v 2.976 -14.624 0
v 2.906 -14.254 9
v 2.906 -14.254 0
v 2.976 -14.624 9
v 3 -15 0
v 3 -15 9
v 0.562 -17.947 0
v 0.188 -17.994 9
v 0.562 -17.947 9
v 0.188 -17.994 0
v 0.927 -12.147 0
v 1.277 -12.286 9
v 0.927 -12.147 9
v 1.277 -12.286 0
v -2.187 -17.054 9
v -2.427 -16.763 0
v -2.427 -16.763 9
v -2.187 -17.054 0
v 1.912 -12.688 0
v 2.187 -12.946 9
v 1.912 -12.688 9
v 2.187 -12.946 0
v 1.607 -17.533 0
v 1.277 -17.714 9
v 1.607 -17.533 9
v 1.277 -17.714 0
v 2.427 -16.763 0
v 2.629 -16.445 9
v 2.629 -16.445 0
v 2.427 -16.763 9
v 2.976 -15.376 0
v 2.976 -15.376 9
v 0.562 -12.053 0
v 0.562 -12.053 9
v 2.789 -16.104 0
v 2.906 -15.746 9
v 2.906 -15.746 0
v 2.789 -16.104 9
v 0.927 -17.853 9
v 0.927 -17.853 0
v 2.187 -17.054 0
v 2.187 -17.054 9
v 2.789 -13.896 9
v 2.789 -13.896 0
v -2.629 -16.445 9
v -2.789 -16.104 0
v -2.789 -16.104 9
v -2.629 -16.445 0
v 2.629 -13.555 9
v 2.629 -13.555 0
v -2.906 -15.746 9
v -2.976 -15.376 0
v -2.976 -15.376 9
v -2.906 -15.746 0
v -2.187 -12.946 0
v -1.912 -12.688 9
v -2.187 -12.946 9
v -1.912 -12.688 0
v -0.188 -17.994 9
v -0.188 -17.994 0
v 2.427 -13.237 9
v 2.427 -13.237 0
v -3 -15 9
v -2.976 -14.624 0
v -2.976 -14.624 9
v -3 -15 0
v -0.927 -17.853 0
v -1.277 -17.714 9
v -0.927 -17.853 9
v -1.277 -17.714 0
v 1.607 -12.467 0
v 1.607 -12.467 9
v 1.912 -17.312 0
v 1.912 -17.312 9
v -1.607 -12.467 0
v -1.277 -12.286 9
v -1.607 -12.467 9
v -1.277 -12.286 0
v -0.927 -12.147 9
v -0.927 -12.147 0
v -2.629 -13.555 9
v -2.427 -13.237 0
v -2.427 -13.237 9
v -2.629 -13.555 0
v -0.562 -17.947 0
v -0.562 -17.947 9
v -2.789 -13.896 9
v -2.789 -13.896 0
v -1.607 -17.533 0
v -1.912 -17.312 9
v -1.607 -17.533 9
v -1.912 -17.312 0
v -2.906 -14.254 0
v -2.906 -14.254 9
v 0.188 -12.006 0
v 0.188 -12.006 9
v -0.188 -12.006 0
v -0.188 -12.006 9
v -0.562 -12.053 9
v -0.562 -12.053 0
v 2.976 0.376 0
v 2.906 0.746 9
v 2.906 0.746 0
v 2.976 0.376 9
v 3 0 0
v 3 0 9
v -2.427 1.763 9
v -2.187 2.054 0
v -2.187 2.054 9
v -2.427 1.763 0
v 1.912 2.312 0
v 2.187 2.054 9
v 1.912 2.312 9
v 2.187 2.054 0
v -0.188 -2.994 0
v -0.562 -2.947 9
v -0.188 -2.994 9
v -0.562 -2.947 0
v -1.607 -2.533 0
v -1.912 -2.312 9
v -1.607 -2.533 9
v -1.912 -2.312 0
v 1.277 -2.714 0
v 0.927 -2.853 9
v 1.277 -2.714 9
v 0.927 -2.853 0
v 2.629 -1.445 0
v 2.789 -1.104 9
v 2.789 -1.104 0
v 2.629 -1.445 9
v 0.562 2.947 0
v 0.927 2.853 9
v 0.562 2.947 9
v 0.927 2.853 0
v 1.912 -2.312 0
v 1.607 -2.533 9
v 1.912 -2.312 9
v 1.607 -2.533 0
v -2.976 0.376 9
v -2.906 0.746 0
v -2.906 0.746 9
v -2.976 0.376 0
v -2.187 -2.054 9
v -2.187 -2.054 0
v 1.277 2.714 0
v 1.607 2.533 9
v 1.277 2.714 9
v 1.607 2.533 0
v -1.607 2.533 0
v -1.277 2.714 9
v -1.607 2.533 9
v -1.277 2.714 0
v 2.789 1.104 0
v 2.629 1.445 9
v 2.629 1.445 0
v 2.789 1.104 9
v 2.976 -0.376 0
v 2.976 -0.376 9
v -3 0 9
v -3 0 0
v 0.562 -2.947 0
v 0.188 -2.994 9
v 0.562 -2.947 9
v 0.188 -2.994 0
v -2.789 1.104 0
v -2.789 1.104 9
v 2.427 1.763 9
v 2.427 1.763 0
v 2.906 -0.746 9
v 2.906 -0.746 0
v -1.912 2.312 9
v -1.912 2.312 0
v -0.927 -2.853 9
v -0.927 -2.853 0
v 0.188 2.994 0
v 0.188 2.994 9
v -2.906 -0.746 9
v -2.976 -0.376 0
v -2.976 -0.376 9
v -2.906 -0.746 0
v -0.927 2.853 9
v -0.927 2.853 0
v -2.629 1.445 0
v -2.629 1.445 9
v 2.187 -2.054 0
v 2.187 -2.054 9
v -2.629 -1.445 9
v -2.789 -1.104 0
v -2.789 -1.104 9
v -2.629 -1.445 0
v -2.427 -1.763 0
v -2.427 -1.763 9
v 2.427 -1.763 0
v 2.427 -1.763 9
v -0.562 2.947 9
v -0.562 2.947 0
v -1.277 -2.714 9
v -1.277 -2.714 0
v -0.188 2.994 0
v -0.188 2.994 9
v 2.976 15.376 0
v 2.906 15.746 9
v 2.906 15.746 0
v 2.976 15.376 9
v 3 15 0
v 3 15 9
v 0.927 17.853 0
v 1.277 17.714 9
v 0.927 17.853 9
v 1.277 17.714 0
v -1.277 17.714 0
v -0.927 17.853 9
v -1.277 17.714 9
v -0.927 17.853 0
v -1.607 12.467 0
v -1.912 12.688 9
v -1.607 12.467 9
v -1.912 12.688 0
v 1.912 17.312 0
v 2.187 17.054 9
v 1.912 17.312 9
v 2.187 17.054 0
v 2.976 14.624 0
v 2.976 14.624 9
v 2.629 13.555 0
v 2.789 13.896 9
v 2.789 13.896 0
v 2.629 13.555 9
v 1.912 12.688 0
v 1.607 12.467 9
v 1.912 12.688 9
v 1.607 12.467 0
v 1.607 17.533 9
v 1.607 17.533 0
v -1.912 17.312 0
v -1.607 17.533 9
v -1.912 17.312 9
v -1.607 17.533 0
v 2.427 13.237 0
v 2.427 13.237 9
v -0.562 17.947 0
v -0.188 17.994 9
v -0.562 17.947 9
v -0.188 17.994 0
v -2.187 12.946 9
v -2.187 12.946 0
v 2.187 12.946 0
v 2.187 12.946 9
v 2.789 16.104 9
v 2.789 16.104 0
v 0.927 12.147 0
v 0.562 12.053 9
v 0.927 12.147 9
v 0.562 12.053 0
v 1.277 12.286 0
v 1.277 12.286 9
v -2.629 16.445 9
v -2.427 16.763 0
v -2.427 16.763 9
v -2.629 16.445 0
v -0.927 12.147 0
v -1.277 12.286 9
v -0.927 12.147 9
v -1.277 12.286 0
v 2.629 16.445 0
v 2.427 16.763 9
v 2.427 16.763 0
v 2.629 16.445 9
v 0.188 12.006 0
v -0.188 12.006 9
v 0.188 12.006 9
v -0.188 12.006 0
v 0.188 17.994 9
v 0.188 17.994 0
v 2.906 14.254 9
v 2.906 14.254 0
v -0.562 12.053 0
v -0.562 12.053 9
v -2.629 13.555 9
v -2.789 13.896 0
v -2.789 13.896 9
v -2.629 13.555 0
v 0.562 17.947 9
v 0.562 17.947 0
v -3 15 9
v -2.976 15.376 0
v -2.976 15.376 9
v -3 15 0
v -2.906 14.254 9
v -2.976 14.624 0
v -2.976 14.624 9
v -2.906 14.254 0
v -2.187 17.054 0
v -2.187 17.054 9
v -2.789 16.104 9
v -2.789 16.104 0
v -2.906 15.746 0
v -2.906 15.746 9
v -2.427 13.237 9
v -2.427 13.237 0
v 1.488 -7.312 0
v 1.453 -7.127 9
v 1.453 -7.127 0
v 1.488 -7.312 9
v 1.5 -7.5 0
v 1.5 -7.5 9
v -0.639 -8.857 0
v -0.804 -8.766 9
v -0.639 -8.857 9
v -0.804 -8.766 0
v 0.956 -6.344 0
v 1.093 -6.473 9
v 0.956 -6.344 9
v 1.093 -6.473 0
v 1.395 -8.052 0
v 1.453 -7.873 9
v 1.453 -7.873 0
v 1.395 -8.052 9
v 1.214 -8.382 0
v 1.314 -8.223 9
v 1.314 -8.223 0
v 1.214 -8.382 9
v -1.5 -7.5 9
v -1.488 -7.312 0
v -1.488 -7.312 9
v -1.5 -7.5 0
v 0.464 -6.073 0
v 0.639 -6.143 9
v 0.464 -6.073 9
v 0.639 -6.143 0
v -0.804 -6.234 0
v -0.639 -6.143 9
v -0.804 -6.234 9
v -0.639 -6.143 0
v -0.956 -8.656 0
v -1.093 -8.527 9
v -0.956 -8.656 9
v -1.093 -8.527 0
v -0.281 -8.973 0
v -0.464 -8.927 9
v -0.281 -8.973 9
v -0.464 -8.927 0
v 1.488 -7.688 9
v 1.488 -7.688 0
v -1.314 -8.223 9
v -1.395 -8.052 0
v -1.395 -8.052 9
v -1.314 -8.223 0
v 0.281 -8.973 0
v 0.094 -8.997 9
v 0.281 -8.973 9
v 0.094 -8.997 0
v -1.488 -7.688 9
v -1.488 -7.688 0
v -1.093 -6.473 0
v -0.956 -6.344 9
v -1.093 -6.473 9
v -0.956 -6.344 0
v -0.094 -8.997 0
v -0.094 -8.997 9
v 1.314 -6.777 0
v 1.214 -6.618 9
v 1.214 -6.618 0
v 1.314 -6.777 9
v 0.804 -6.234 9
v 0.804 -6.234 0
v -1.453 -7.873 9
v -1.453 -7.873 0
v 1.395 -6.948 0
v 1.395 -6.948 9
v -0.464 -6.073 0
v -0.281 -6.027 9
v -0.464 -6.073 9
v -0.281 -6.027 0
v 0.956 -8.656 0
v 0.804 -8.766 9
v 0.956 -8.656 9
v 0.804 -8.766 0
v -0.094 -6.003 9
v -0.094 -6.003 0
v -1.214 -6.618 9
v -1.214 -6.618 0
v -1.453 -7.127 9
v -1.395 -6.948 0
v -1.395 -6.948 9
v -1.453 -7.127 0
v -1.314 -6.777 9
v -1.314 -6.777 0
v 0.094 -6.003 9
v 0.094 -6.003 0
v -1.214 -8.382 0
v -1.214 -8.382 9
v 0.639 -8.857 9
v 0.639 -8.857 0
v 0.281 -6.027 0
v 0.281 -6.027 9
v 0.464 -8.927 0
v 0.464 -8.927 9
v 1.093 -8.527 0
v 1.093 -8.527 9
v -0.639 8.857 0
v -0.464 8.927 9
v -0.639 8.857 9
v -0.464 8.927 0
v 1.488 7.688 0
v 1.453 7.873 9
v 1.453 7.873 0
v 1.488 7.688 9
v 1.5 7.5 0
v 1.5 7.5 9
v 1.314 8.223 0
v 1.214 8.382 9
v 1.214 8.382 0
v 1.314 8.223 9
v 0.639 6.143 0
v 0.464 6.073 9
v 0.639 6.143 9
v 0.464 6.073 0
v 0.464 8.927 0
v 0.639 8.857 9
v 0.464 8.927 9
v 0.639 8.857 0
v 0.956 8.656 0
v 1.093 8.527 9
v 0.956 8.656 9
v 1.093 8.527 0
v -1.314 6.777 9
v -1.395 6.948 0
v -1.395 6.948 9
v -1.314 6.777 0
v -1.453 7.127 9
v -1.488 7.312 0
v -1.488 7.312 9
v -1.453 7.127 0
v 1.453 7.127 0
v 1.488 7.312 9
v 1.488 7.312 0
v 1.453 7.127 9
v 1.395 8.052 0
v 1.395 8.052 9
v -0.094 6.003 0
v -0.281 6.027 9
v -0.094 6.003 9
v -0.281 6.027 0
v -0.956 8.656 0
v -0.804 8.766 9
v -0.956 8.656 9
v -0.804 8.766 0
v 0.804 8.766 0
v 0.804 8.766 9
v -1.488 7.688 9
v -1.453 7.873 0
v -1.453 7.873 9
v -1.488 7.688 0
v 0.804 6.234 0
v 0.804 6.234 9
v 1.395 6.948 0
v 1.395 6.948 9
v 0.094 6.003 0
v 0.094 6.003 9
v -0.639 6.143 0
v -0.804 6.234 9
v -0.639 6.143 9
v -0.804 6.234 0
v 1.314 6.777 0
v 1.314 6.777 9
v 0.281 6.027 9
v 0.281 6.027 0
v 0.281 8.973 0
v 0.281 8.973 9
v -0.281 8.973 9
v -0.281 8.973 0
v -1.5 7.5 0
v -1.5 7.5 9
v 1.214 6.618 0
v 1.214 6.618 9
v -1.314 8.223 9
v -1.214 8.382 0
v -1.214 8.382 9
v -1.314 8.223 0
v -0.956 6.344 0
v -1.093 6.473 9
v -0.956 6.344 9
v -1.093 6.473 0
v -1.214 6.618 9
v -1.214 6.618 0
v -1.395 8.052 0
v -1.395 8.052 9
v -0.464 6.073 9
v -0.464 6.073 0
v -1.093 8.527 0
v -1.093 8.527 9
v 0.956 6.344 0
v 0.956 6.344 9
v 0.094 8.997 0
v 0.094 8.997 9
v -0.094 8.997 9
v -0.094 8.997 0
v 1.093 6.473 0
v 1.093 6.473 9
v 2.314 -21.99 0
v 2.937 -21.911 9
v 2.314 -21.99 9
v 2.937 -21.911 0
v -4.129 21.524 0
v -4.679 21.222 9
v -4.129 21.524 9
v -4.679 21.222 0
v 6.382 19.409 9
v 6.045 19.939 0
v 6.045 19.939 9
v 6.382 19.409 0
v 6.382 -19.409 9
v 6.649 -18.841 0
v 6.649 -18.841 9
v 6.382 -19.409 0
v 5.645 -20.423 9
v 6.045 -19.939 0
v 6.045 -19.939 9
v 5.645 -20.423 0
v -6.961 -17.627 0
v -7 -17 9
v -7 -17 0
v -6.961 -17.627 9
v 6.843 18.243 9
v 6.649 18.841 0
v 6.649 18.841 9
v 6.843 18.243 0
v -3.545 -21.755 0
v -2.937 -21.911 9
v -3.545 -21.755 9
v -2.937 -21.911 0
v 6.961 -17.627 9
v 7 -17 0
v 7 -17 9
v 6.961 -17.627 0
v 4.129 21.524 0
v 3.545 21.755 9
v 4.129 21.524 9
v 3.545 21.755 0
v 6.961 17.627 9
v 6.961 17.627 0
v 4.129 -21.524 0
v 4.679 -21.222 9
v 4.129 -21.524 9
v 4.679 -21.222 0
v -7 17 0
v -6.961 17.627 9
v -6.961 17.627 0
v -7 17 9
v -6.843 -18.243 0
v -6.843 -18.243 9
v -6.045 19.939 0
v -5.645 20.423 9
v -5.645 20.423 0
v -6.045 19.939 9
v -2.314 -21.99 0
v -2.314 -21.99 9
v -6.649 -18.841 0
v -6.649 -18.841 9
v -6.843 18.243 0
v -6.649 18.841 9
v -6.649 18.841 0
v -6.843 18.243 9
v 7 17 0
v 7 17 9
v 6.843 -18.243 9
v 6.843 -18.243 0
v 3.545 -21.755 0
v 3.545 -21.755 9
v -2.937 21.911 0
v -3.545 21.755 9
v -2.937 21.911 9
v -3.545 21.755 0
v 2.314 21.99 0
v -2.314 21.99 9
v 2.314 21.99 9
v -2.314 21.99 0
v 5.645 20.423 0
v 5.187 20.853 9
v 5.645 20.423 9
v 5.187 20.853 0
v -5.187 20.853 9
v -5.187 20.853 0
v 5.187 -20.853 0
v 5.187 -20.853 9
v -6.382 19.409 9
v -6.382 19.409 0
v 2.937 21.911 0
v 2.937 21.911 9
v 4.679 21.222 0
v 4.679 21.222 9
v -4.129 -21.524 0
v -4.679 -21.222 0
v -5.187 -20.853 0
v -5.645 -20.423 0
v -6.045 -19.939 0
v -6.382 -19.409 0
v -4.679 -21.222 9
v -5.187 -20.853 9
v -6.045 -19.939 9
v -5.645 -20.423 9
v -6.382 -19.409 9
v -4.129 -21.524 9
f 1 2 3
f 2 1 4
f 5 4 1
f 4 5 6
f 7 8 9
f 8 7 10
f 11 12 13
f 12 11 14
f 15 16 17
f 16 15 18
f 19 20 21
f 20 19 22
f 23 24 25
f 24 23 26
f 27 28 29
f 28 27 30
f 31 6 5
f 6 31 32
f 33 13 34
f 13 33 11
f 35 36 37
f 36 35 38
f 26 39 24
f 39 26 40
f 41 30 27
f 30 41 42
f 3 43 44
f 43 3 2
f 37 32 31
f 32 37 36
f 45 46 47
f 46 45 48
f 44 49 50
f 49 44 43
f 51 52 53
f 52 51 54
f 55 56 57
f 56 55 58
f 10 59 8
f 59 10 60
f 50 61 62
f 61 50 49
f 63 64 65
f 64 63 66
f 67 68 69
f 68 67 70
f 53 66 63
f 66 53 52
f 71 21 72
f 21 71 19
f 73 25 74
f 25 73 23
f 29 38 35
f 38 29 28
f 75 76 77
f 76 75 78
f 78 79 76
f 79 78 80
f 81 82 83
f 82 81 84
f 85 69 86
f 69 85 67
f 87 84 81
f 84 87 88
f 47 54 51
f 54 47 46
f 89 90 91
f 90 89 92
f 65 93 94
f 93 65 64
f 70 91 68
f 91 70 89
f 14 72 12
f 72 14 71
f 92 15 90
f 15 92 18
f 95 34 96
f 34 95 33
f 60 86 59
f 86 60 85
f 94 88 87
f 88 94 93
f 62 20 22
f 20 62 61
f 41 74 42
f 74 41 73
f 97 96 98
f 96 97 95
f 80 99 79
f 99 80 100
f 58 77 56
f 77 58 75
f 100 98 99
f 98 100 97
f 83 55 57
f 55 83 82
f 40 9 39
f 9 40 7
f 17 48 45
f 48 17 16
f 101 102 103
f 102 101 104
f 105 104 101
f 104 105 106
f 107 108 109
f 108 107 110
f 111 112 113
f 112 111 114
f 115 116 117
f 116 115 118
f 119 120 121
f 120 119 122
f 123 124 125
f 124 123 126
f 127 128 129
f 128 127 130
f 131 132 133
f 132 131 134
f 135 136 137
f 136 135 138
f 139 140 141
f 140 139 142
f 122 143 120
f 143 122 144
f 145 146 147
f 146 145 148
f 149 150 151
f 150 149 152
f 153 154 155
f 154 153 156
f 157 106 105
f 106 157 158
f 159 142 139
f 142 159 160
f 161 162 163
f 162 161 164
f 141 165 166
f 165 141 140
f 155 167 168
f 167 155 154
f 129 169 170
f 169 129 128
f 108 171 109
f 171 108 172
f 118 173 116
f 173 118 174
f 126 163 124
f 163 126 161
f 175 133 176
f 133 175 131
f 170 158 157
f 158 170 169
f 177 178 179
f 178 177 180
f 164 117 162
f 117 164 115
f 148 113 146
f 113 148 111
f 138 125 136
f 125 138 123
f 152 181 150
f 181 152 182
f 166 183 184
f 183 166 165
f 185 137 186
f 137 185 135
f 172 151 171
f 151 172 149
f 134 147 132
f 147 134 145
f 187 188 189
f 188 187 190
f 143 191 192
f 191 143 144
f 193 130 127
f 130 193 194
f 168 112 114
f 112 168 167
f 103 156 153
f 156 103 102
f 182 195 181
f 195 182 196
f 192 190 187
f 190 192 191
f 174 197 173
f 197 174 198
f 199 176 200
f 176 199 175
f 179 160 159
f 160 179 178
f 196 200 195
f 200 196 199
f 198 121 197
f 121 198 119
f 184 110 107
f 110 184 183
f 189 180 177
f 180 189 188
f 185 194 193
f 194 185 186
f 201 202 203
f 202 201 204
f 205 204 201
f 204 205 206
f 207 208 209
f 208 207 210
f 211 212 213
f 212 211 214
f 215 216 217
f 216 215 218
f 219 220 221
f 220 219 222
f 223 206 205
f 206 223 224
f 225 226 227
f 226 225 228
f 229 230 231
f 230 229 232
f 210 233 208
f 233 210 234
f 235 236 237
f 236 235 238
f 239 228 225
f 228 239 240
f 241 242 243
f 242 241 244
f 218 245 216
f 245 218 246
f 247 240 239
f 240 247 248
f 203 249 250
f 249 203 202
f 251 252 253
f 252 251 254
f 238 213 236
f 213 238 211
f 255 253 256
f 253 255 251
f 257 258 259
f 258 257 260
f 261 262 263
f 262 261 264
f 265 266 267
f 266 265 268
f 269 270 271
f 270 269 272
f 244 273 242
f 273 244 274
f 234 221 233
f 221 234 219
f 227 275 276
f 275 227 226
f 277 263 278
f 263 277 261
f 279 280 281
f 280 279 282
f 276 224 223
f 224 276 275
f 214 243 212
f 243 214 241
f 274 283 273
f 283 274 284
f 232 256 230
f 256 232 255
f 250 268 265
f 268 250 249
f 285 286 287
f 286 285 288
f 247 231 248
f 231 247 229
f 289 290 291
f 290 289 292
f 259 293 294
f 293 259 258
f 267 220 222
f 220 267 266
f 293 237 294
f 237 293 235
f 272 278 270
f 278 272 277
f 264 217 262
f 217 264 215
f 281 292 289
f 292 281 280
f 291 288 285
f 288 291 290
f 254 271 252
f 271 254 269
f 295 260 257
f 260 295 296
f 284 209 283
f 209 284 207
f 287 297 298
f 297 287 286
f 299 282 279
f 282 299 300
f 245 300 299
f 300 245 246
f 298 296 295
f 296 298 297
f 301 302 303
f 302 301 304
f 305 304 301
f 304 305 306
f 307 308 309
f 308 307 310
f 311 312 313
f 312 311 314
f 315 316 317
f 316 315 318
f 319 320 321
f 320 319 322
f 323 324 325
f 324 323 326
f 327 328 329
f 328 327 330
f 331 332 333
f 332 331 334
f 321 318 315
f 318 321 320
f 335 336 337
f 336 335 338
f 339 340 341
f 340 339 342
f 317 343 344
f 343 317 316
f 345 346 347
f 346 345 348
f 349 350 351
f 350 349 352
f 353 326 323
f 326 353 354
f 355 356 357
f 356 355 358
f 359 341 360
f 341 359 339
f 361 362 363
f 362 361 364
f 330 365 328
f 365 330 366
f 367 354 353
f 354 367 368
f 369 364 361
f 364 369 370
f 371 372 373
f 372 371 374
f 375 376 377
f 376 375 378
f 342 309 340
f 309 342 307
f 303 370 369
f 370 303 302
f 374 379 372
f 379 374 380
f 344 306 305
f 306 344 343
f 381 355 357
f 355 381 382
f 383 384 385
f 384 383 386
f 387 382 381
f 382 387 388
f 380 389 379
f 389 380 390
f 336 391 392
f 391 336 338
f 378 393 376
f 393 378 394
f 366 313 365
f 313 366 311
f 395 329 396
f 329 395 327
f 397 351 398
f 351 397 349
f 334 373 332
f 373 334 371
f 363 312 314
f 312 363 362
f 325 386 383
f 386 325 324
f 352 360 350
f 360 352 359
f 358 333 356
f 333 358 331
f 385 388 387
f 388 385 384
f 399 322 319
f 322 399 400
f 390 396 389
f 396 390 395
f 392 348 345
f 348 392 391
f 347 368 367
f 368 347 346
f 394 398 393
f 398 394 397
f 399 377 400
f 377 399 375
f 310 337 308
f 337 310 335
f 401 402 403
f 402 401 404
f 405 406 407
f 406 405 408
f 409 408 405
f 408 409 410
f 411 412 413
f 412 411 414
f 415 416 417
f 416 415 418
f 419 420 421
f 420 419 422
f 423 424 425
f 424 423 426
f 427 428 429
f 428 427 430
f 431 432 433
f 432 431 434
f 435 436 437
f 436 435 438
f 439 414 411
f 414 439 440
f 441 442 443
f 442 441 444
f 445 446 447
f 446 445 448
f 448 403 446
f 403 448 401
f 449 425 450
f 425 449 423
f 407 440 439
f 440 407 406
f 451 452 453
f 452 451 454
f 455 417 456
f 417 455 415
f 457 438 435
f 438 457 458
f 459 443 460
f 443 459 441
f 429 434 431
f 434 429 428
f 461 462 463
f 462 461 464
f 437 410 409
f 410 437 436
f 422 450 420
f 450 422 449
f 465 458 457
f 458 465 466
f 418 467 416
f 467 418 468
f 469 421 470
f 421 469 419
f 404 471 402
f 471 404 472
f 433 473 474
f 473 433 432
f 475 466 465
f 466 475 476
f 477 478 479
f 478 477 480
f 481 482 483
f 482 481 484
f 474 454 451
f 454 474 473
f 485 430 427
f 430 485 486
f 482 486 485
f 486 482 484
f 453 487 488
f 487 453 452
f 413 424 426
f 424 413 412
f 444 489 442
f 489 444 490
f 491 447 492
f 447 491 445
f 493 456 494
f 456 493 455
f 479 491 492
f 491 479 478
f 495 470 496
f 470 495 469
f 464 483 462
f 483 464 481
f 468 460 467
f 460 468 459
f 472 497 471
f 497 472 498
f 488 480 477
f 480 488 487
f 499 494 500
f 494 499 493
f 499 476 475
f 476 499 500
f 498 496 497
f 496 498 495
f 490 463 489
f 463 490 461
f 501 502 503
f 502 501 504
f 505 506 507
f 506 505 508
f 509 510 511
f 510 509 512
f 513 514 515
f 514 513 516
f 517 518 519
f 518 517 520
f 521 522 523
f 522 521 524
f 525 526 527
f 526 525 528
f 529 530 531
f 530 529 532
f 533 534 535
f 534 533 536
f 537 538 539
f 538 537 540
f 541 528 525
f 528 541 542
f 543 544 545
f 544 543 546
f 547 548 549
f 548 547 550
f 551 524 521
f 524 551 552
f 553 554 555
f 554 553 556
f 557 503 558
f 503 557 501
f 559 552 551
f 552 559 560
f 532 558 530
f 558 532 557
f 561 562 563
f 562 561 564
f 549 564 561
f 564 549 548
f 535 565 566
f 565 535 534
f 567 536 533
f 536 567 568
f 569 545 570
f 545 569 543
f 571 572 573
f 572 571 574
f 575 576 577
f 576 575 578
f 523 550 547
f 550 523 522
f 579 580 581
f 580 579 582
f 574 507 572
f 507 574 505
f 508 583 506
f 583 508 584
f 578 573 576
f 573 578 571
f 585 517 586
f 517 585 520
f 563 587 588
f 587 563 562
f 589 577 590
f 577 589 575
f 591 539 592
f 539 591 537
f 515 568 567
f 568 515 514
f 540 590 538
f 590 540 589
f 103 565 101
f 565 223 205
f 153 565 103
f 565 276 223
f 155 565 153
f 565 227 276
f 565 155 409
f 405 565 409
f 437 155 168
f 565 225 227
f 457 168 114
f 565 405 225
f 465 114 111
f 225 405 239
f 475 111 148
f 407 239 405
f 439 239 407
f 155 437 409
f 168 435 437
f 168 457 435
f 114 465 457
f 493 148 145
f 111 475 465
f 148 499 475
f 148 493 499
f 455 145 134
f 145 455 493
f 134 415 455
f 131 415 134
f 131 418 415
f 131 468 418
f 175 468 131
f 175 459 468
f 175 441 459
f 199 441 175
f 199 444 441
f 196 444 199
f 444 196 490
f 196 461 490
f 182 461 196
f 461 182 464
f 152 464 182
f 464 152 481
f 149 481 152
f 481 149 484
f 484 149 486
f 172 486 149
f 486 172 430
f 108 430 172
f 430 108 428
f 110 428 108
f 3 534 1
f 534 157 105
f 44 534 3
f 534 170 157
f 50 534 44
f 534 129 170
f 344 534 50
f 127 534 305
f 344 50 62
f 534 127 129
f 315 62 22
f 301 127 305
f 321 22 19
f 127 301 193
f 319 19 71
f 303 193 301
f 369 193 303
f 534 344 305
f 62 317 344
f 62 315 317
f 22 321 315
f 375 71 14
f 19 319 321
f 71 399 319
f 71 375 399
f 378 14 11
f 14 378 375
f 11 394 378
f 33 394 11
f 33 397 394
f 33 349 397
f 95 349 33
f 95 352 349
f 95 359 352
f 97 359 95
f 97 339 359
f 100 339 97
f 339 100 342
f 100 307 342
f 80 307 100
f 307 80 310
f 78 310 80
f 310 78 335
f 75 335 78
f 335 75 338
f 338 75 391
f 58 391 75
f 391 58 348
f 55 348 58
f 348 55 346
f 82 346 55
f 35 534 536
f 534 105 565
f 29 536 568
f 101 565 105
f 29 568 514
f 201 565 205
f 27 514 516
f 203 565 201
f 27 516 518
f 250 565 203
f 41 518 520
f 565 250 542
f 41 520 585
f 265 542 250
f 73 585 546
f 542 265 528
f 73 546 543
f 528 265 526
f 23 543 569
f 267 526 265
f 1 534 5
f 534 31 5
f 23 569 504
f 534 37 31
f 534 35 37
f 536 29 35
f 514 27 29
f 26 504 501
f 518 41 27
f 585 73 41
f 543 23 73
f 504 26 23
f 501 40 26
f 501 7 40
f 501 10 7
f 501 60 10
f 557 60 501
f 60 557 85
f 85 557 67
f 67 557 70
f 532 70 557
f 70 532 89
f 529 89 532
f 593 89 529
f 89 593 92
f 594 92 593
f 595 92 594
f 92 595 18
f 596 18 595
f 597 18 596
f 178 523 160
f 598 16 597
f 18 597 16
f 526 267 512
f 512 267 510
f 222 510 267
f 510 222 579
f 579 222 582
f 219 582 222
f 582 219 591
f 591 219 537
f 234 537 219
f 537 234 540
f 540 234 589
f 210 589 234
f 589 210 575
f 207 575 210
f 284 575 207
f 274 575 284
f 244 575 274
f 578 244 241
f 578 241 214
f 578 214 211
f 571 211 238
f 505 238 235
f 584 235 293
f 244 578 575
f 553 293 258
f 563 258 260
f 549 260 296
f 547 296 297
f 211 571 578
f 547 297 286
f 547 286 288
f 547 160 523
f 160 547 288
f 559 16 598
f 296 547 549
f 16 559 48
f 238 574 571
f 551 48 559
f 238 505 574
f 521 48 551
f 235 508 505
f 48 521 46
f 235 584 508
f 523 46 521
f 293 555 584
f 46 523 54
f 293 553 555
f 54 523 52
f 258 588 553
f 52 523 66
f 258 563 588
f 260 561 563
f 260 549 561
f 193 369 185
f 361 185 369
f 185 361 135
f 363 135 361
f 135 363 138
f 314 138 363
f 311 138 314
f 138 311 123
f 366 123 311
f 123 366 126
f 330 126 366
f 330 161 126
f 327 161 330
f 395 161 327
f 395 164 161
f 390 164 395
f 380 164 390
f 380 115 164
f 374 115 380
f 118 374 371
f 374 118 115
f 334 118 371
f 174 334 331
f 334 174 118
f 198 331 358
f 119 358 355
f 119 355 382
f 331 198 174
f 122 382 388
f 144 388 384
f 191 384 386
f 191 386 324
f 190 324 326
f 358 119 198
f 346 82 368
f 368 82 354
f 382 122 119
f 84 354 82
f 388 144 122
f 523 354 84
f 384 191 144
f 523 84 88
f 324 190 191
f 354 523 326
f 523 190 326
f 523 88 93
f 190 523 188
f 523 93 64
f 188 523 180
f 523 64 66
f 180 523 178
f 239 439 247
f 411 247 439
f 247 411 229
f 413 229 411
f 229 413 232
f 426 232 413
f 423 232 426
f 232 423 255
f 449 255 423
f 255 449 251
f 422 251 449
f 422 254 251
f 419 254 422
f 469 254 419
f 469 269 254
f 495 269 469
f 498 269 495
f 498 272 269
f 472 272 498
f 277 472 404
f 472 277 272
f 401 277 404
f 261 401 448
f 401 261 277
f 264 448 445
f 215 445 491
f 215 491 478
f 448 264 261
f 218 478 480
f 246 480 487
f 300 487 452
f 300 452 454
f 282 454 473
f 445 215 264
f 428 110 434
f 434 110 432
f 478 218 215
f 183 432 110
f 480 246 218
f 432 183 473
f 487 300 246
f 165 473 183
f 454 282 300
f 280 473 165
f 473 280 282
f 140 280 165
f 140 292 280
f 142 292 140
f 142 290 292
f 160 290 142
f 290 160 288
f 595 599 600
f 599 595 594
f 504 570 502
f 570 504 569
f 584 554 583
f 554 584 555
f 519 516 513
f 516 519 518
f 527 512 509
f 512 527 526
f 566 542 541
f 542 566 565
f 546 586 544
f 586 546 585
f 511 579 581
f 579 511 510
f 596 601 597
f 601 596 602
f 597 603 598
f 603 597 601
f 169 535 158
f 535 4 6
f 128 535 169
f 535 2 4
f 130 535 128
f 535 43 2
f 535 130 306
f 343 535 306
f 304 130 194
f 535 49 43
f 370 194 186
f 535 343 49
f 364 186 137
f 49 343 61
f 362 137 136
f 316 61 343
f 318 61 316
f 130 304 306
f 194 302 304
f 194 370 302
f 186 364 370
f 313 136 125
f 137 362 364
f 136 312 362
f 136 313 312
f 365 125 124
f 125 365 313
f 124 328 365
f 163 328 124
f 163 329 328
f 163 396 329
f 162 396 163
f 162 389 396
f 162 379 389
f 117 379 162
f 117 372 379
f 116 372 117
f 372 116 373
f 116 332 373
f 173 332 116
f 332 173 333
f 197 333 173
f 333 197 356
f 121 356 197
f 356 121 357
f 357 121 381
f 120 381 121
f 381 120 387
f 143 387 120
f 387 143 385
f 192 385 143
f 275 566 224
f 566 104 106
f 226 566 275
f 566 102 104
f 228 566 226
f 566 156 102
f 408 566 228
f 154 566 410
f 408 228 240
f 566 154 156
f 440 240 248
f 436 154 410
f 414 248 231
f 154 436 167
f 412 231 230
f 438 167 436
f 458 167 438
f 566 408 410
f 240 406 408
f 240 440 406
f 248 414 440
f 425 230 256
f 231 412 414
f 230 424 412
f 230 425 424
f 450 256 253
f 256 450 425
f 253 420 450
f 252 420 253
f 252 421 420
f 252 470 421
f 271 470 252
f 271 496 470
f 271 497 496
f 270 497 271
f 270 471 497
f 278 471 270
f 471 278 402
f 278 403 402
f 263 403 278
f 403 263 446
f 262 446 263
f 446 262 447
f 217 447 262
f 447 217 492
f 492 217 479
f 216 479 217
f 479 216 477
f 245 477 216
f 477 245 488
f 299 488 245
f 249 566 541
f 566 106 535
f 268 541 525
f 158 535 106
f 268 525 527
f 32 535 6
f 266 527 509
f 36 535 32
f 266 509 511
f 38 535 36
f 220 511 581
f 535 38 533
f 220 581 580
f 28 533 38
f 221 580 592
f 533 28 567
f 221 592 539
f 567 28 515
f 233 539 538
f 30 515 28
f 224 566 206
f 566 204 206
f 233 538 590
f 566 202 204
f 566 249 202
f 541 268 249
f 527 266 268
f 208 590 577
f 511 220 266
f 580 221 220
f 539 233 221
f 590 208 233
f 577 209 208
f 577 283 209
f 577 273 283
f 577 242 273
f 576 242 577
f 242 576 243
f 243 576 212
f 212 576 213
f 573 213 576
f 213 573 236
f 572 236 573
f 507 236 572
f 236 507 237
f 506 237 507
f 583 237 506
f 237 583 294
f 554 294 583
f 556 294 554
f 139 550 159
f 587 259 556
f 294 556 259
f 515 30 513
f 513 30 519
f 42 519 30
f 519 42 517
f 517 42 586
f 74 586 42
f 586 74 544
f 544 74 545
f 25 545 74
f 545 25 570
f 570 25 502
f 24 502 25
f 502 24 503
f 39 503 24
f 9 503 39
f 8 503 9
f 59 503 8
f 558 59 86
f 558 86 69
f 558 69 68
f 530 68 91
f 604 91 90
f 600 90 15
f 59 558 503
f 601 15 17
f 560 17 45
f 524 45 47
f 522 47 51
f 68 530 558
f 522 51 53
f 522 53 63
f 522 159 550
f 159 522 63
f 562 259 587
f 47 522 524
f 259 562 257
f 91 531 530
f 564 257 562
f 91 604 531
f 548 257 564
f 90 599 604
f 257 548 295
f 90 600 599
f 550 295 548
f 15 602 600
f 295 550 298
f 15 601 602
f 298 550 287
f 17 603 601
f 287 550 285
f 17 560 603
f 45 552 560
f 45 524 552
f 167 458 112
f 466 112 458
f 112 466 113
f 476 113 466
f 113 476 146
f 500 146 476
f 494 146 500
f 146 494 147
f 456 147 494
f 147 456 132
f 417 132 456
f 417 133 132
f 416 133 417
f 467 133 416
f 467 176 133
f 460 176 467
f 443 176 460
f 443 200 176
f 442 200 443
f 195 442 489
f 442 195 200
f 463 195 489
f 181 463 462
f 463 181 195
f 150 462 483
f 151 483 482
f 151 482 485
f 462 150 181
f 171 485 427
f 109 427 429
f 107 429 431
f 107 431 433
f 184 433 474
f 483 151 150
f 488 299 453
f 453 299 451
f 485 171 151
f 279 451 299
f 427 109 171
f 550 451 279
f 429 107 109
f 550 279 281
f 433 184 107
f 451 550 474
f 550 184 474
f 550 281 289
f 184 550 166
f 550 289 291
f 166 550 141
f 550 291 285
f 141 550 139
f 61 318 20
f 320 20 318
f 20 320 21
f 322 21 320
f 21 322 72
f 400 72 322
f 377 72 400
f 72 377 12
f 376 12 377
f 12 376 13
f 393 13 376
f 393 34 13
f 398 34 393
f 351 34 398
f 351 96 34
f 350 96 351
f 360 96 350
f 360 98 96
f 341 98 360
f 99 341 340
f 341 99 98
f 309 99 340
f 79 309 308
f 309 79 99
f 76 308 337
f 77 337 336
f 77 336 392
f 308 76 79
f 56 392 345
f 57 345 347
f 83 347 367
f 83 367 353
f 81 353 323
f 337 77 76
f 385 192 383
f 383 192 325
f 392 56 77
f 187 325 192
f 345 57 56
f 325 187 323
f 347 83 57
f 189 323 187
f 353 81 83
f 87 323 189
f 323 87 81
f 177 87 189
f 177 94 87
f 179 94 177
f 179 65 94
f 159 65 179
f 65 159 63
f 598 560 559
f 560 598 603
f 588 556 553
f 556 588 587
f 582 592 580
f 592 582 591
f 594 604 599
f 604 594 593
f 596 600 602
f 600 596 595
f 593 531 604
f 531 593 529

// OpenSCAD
$fn = 50;

difference() {
	union() {
		hull() {
			translate(v = [-2.0, 17.0, 0]) {
				cylinder(h = 9, r = 5);
			}
			translate(v = [2.0, 17.0, 0]) {
				cylinder(h = 9, r = 5);
			}
			translate(v = [-2.0, -17.0, 0]) {
				cylinder(h = 9, r = 5);
			}
			translate(v = [2.0, -17.0, 0]) {
				cylinder(h = 9, r = 5);
			}
		}
	}
	union() {
		translate(v = [0.0, -15.0, 0]) {
			translate(v = [0, 0, -100]) {
				cylinder(h = 200, r = 3.0);
			}
		}
		translate(v = [0, 0, -100]) {
			cylinder(h = 200, r = 3.0);
		}
		translate(v = [0.0, 15.0, 0]) {
			translate(v = [0, 0, -100]) {
				cylinder(h = 200, r = 3.0);
			}
		}
		translate(v = [0.0, -15.0, 0]) {
			translate(v = [0, 0, -100]) {
				cylinder(h = 200, r = 1.5);
			}
		}
		translate(v = [0.0, -7.5, 0]) {
			translate(v = [0, 0, -100]) {
				cylinder(h = 200, r = 1.5);
			}
		}
		translate(v = [0, 0, -100]) {
			cylinder(h = 200, r = 1.5);
		}
		translate(v = [0.0, 7.5, 0]) {
			translate(v = [0, 0, -100]) {
				cylinder(h = 200, r = 1.5);
			}
		}
		translate(v = [0.0, 15.0, 0]) {
			translate(v = [0, 0, -100]) {
				cylinder(h = 200, r = 1.5);
			}
		}
	}
}
